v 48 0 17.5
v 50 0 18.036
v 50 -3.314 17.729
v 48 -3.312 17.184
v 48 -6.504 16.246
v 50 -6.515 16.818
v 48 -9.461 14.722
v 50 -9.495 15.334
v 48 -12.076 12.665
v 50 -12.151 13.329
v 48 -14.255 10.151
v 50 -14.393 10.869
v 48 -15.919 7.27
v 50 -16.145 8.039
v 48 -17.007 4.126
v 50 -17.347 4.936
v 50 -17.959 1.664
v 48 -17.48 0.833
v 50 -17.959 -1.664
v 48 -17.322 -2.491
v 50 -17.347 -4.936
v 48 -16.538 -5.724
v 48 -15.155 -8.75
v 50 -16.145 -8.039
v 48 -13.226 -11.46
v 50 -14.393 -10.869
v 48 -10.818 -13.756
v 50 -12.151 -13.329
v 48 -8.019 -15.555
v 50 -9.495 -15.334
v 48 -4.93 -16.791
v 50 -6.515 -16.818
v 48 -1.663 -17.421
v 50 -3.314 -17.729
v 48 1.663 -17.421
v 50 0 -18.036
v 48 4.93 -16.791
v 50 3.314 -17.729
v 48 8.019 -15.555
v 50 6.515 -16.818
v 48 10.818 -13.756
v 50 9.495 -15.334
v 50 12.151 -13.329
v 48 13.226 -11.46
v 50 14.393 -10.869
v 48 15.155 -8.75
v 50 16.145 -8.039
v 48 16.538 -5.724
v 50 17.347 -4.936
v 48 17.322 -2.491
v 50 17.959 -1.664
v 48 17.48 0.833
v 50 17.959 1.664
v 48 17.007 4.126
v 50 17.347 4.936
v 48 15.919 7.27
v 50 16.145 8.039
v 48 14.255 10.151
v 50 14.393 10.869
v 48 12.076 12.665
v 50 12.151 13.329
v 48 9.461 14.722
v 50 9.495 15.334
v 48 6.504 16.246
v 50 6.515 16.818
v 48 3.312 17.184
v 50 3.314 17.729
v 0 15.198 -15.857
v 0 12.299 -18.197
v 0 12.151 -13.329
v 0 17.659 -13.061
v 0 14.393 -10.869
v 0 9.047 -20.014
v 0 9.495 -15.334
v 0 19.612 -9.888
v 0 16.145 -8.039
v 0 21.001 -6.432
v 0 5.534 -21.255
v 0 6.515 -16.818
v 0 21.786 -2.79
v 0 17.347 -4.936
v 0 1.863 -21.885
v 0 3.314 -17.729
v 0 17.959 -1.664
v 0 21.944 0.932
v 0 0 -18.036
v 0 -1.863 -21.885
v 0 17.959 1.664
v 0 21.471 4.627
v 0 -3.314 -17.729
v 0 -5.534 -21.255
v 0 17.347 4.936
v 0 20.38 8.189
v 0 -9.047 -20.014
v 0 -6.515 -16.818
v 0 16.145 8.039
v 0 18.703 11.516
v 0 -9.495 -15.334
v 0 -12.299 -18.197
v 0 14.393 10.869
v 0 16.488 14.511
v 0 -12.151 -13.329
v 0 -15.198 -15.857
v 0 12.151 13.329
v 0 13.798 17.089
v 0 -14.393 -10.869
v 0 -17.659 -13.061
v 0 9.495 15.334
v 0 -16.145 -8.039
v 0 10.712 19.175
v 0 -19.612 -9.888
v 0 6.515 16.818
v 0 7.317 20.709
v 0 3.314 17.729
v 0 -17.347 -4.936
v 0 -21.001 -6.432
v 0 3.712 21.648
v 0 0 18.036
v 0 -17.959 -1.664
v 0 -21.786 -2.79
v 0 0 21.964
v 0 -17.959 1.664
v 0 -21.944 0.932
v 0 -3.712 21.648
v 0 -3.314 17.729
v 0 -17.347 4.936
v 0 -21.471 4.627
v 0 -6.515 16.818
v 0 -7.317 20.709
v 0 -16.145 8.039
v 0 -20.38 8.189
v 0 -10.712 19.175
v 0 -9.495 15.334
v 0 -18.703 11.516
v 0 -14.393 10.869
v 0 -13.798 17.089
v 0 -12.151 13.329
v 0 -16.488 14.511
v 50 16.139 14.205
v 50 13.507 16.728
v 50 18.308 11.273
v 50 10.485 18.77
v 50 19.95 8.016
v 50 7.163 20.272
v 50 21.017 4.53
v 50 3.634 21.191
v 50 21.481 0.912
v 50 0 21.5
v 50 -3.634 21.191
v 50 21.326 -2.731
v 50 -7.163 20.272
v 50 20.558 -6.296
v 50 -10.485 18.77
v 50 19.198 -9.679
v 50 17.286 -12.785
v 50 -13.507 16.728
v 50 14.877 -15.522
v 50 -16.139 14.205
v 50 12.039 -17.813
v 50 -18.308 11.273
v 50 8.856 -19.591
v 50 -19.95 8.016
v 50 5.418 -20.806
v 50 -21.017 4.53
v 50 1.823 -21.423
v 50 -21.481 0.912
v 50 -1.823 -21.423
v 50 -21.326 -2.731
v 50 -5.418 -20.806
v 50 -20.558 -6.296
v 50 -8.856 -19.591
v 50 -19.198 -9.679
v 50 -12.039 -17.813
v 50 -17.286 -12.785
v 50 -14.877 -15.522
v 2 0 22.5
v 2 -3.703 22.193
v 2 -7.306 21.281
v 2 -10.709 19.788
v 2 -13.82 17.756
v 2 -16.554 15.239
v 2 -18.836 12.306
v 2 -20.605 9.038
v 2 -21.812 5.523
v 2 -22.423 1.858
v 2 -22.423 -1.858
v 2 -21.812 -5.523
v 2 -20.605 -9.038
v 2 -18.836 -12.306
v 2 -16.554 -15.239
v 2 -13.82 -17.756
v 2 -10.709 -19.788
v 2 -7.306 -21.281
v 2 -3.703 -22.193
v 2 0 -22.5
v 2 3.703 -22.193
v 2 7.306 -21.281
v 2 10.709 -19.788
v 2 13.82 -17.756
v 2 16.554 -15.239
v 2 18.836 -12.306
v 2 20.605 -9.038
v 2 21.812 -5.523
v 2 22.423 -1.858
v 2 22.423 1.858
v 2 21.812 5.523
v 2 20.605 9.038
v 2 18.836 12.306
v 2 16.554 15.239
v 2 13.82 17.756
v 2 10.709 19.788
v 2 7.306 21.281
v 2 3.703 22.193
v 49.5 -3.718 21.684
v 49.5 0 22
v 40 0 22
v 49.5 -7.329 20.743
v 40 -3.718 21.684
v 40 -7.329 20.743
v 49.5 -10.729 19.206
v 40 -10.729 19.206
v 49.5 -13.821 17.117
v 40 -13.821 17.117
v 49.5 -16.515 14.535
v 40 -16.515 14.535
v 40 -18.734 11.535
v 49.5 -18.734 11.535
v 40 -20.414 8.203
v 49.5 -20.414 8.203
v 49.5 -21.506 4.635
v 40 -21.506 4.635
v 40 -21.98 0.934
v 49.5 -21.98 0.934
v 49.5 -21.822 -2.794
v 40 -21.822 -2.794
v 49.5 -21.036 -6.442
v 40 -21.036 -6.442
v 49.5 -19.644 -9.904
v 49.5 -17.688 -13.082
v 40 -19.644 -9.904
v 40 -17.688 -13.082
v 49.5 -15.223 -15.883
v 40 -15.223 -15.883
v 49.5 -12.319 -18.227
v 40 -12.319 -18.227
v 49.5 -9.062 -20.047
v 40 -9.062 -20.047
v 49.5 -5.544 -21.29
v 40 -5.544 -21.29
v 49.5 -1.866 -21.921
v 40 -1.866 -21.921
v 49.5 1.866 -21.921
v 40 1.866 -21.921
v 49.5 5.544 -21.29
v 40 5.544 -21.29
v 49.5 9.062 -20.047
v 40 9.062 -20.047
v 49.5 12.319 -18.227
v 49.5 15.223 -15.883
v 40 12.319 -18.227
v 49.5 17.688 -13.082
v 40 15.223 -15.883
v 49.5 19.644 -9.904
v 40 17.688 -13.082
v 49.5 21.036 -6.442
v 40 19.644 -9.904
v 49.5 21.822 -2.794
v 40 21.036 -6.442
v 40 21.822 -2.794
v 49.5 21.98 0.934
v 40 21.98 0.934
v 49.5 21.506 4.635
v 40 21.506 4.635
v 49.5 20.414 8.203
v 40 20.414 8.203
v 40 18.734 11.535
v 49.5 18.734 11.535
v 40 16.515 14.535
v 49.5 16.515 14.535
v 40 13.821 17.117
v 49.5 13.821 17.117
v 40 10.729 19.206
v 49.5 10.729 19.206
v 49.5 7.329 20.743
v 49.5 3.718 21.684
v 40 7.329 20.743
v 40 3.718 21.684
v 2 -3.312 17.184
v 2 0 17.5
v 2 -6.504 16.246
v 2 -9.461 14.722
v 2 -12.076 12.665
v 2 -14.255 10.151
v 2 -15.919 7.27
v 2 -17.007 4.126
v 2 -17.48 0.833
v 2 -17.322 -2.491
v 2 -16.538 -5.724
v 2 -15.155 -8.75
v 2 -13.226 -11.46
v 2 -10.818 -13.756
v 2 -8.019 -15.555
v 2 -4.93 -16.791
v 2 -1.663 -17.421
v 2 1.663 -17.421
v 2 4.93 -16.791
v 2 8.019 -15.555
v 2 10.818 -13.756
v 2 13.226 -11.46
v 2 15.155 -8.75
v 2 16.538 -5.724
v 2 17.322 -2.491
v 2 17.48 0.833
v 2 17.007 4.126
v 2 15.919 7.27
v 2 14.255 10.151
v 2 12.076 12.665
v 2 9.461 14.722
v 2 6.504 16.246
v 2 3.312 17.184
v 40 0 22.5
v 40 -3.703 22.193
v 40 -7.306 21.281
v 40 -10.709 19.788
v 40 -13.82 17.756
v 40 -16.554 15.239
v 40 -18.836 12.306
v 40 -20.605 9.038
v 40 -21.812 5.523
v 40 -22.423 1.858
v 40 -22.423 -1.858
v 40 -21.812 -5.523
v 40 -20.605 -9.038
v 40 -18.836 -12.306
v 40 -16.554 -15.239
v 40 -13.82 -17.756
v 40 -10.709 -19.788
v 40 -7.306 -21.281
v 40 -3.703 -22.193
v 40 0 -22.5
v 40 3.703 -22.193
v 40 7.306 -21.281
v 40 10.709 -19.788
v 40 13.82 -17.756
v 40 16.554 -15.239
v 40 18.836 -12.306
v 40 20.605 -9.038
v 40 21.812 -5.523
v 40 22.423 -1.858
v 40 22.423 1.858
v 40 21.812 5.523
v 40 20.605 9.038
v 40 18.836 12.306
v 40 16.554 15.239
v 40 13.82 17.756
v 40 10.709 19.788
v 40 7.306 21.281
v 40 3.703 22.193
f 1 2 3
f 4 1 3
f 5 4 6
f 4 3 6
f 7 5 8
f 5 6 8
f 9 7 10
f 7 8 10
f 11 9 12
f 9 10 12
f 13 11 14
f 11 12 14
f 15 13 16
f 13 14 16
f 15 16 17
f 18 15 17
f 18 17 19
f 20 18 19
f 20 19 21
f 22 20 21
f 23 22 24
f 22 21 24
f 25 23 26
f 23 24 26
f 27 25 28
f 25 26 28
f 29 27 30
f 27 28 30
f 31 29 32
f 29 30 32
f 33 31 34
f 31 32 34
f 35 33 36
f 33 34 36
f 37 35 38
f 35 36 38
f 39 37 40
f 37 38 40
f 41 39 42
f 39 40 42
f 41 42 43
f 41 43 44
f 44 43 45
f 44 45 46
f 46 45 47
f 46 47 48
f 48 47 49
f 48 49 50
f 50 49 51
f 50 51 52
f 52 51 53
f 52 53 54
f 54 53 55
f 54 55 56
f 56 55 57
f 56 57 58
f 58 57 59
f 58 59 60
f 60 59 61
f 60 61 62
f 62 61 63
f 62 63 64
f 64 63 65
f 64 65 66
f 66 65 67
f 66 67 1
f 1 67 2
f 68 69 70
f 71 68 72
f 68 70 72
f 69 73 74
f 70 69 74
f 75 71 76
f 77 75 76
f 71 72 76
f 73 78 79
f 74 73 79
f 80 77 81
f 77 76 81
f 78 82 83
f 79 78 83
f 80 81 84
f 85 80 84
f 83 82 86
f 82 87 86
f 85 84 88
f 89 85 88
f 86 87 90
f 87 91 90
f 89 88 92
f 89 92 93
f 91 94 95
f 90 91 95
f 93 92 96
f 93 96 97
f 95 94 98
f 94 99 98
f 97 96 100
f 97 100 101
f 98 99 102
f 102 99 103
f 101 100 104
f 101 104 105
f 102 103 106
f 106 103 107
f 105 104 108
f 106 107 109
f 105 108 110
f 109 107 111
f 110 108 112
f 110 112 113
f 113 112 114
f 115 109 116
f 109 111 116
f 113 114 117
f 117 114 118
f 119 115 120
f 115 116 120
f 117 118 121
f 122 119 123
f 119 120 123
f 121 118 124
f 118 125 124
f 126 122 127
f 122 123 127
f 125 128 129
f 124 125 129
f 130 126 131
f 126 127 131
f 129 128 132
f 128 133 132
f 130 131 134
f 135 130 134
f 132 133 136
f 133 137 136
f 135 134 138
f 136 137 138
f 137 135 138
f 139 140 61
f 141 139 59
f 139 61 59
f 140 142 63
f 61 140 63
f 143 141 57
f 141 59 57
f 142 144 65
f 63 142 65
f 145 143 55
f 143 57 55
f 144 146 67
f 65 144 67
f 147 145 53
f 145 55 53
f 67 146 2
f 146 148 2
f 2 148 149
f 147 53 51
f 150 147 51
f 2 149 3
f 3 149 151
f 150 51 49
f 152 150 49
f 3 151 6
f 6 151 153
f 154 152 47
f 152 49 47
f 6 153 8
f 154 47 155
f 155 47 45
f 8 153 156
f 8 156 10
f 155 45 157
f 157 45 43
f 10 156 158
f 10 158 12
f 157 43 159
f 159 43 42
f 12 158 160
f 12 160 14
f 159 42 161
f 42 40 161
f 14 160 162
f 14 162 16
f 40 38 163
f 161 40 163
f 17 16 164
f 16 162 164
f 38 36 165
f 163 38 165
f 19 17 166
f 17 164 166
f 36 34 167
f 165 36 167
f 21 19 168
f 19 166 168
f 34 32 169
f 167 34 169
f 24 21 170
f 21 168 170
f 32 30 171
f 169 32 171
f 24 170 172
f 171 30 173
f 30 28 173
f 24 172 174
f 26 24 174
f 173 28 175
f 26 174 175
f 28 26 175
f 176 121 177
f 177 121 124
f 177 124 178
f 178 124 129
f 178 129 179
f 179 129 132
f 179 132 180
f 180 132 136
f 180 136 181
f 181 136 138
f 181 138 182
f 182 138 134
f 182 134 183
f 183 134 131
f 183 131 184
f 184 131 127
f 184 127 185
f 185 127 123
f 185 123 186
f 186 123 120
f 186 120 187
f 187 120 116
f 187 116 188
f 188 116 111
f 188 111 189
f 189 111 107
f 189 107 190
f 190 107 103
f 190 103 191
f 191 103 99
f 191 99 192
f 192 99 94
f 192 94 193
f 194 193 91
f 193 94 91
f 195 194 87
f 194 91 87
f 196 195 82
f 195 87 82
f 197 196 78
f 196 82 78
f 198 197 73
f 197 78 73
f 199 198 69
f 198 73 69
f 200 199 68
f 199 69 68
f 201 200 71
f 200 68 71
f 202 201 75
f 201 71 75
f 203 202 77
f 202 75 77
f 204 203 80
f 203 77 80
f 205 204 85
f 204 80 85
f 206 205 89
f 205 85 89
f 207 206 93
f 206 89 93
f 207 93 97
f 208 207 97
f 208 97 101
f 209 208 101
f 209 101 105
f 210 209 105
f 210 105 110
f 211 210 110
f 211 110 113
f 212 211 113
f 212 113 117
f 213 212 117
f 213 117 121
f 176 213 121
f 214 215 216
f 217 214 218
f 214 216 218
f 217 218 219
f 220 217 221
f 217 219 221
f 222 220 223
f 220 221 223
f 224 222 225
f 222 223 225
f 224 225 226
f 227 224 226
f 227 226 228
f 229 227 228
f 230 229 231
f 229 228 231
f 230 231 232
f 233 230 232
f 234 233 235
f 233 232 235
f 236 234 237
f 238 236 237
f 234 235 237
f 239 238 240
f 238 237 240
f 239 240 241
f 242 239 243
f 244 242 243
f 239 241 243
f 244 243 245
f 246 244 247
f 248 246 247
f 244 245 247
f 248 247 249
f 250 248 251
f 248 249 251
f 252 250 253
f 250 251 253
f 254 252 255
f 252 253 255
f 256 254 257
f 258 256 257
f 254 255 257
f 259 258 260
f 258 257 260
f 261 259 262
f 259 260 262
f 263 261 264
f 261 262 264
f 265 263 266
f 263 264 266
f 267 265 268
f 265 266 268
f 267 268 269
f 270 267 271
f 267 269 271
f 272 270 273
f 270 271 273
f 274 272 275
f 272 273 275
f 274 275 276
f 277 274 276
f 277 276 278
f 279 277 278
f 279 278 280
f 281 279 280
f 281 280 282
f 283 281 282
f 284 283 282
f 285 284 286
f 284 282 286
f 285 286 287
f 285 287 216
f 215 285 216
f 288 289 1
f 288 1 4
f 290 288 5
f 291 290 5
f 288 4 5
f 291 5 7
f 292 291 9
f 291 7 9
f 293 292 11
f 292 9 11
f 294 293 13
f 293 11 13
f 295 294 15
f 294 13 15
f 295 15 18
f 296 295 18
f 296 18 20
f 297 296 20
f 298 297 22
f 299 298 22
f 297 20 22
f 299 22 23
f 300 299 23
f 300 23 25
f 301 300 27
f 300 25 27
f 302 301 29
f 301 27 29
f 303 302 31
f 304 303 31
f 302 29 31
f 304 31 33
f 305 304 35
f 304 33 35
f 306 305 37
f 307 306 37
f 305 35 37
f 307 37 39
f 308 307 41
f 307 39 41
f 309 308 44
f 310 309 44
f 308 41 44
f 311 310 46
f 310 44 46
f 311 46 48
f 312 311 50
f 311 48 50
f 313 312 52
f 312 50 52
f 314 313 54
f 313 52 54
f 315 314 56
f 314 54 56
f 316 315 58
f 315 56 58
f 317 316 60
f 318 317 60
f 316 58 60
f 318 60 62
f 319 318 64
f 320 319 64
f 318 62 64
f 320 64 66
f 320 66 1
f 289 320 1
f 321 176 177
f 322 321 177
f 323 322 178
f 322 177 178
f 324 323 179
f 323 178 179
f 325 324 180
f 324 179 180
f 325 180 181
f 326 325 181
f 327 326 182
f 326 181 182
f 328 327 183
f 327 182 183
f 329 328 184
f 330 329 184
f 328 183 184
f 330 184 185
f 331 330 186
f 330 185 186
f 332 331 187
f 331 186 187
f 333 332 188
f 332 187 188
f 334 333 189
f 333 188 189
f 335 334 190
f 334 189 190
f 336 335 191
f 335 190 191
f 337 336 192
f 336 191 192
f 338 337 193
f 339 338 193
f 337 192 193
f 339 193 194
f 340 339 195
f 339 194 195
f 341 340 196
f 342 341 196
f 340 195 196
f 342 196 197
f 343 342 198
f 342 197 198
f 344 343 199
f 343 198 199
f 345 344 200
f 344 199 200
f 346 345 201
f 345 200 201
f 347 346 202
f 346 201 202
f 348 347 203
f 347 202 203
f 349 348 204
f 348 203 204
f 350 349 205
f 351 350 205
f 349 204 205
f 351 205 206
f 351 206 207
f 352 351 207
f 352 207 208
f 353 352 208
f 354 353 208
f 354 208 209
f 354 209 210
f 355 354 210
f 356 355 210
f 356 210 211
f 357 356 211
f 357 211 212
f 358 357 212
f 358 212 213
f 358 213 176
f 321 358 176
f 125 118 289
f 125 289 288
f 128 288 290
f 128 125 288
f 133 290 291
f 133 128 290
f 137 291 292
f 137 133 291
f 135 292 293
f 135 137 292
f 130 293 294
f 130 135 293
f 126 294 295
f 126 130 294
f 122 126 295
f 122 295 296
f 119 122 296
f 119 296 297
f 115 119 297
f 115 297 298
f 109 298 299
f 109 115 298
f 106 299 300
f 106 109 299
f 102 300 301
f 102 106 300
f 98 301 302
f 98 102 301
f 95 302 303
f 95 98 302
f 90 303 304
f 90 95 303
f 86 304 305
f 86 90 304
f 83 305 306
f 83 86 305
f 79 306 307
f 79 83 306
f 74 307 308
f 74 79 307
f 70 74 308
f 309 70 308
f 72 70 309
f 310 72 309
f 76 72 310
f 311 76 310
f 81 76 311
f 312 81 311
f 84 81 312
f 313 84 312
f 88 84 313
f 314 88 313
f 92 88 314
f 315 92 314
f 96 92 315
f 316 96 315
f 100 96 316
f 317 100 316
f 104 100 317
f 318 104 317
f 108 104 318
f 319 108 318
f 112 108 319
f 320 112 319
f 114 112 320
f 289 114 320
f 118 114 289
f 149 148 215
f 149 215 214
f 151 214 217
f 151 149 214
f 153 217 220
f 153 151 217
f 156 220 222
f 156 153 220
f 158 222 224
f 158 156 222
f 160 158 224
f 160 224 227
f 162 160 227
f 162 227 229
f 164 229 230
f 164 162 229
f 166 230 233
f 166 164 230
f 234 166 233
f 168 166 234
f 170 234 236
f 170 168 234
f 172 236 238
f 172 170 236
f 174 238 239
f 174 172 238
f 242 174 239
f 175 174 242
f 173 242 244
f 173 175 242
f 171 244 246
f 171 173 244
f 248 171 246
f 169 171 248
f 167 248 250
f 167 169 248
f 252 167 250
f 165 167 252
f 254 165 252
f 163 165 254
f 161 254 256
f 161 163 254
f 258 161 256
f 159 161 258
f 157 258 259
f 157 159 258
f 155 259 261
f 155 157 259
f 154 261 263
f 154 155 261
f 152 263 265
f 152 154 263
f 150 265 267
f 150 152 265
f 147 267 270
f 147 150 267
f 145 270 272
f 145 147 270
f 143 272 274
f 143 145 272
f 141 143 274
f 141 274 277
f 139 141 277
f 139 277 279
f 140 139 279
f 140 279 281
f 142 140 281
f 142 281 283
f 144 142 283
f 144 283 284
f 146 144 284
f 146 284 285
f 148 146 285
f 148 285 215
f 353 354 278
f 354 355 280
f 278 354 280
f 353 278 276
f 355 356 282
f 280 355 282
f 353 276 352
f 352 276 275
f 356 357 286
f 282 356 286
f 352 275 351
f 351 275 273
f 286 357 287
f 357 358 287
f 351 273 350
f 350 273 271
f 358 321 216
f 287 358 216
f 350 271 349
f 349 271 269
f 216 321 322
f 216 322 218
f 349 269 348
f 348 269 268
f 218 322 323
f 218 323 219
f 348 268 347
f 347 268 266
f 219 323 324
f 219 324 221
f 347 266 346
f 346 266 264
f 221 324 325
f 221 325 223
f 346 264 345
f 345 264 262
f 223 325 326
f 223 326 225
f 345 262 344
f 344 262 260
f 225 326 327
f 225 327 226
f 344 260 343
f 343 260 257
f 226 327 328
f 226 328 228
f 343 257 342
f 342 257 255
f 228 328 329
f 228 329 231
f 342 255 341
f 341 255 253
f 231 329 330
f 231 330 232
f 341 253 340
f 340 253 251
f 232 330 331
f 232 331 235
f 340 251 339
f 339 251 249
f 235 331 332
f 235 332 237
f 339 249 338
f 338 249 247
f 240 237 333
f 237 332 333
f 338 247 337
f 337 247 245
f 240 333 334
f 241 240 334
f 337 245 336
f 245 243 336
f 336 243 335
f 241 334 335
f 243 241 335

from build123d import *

# Parameters (mm, degrees)
F2_SIZE2   = 0.5358983849
F2_SIZE    = 2
F2_2_SIZE2 = 0.5358983849
F2_2_SIZE  = 2
F3_SIZE    = 0.5


with BuildPart() as f1:
    # F0 (on Front) → F1 (revolve)
    with BuildSketch(Plane.XZ):
        Polygon((0, 22.5), (0, 17.5), (50, 17.5), (50, 22), (40, 22), (40, 22.5), align=None)
    revolve(axis=Axis((25, 0, 0), (1, 0, 0)))

    # F2
    f2_edges = [f1.edges().sort_by_distance(p)[0] for p in [
        (0, 0, -17.5),
        (50, 0, -17.5),
    ]]
    f2_side = f1.faces().sort_by_distance((25, 0, -17.5))[0]
    chamfer(f2_edges, length=F2_SIZE, length2=F2_SIZE2, reference=f2_side)

    # F2#2
    f2_2_edges = [f1.edges().sort_by_distance(p)[0] for p in [
        (0, 0, -22.5),
    ]]
    f2_2_side = f1.faces().sort_by_distance((20, 0, -22.5))[0]
    chamfer(f2_2_edges, length=F2_2_SIZE, length2=F2_2_SIZE2, reference=f2_2_side)

    # F3
    f3_edges = [f1.edges().sort_by_distance(p)[0] for p in [
        (50, 0, -22),
    ]]
    chamfer(f3_edges, length=F3_SIZE)


solid = f1.part
